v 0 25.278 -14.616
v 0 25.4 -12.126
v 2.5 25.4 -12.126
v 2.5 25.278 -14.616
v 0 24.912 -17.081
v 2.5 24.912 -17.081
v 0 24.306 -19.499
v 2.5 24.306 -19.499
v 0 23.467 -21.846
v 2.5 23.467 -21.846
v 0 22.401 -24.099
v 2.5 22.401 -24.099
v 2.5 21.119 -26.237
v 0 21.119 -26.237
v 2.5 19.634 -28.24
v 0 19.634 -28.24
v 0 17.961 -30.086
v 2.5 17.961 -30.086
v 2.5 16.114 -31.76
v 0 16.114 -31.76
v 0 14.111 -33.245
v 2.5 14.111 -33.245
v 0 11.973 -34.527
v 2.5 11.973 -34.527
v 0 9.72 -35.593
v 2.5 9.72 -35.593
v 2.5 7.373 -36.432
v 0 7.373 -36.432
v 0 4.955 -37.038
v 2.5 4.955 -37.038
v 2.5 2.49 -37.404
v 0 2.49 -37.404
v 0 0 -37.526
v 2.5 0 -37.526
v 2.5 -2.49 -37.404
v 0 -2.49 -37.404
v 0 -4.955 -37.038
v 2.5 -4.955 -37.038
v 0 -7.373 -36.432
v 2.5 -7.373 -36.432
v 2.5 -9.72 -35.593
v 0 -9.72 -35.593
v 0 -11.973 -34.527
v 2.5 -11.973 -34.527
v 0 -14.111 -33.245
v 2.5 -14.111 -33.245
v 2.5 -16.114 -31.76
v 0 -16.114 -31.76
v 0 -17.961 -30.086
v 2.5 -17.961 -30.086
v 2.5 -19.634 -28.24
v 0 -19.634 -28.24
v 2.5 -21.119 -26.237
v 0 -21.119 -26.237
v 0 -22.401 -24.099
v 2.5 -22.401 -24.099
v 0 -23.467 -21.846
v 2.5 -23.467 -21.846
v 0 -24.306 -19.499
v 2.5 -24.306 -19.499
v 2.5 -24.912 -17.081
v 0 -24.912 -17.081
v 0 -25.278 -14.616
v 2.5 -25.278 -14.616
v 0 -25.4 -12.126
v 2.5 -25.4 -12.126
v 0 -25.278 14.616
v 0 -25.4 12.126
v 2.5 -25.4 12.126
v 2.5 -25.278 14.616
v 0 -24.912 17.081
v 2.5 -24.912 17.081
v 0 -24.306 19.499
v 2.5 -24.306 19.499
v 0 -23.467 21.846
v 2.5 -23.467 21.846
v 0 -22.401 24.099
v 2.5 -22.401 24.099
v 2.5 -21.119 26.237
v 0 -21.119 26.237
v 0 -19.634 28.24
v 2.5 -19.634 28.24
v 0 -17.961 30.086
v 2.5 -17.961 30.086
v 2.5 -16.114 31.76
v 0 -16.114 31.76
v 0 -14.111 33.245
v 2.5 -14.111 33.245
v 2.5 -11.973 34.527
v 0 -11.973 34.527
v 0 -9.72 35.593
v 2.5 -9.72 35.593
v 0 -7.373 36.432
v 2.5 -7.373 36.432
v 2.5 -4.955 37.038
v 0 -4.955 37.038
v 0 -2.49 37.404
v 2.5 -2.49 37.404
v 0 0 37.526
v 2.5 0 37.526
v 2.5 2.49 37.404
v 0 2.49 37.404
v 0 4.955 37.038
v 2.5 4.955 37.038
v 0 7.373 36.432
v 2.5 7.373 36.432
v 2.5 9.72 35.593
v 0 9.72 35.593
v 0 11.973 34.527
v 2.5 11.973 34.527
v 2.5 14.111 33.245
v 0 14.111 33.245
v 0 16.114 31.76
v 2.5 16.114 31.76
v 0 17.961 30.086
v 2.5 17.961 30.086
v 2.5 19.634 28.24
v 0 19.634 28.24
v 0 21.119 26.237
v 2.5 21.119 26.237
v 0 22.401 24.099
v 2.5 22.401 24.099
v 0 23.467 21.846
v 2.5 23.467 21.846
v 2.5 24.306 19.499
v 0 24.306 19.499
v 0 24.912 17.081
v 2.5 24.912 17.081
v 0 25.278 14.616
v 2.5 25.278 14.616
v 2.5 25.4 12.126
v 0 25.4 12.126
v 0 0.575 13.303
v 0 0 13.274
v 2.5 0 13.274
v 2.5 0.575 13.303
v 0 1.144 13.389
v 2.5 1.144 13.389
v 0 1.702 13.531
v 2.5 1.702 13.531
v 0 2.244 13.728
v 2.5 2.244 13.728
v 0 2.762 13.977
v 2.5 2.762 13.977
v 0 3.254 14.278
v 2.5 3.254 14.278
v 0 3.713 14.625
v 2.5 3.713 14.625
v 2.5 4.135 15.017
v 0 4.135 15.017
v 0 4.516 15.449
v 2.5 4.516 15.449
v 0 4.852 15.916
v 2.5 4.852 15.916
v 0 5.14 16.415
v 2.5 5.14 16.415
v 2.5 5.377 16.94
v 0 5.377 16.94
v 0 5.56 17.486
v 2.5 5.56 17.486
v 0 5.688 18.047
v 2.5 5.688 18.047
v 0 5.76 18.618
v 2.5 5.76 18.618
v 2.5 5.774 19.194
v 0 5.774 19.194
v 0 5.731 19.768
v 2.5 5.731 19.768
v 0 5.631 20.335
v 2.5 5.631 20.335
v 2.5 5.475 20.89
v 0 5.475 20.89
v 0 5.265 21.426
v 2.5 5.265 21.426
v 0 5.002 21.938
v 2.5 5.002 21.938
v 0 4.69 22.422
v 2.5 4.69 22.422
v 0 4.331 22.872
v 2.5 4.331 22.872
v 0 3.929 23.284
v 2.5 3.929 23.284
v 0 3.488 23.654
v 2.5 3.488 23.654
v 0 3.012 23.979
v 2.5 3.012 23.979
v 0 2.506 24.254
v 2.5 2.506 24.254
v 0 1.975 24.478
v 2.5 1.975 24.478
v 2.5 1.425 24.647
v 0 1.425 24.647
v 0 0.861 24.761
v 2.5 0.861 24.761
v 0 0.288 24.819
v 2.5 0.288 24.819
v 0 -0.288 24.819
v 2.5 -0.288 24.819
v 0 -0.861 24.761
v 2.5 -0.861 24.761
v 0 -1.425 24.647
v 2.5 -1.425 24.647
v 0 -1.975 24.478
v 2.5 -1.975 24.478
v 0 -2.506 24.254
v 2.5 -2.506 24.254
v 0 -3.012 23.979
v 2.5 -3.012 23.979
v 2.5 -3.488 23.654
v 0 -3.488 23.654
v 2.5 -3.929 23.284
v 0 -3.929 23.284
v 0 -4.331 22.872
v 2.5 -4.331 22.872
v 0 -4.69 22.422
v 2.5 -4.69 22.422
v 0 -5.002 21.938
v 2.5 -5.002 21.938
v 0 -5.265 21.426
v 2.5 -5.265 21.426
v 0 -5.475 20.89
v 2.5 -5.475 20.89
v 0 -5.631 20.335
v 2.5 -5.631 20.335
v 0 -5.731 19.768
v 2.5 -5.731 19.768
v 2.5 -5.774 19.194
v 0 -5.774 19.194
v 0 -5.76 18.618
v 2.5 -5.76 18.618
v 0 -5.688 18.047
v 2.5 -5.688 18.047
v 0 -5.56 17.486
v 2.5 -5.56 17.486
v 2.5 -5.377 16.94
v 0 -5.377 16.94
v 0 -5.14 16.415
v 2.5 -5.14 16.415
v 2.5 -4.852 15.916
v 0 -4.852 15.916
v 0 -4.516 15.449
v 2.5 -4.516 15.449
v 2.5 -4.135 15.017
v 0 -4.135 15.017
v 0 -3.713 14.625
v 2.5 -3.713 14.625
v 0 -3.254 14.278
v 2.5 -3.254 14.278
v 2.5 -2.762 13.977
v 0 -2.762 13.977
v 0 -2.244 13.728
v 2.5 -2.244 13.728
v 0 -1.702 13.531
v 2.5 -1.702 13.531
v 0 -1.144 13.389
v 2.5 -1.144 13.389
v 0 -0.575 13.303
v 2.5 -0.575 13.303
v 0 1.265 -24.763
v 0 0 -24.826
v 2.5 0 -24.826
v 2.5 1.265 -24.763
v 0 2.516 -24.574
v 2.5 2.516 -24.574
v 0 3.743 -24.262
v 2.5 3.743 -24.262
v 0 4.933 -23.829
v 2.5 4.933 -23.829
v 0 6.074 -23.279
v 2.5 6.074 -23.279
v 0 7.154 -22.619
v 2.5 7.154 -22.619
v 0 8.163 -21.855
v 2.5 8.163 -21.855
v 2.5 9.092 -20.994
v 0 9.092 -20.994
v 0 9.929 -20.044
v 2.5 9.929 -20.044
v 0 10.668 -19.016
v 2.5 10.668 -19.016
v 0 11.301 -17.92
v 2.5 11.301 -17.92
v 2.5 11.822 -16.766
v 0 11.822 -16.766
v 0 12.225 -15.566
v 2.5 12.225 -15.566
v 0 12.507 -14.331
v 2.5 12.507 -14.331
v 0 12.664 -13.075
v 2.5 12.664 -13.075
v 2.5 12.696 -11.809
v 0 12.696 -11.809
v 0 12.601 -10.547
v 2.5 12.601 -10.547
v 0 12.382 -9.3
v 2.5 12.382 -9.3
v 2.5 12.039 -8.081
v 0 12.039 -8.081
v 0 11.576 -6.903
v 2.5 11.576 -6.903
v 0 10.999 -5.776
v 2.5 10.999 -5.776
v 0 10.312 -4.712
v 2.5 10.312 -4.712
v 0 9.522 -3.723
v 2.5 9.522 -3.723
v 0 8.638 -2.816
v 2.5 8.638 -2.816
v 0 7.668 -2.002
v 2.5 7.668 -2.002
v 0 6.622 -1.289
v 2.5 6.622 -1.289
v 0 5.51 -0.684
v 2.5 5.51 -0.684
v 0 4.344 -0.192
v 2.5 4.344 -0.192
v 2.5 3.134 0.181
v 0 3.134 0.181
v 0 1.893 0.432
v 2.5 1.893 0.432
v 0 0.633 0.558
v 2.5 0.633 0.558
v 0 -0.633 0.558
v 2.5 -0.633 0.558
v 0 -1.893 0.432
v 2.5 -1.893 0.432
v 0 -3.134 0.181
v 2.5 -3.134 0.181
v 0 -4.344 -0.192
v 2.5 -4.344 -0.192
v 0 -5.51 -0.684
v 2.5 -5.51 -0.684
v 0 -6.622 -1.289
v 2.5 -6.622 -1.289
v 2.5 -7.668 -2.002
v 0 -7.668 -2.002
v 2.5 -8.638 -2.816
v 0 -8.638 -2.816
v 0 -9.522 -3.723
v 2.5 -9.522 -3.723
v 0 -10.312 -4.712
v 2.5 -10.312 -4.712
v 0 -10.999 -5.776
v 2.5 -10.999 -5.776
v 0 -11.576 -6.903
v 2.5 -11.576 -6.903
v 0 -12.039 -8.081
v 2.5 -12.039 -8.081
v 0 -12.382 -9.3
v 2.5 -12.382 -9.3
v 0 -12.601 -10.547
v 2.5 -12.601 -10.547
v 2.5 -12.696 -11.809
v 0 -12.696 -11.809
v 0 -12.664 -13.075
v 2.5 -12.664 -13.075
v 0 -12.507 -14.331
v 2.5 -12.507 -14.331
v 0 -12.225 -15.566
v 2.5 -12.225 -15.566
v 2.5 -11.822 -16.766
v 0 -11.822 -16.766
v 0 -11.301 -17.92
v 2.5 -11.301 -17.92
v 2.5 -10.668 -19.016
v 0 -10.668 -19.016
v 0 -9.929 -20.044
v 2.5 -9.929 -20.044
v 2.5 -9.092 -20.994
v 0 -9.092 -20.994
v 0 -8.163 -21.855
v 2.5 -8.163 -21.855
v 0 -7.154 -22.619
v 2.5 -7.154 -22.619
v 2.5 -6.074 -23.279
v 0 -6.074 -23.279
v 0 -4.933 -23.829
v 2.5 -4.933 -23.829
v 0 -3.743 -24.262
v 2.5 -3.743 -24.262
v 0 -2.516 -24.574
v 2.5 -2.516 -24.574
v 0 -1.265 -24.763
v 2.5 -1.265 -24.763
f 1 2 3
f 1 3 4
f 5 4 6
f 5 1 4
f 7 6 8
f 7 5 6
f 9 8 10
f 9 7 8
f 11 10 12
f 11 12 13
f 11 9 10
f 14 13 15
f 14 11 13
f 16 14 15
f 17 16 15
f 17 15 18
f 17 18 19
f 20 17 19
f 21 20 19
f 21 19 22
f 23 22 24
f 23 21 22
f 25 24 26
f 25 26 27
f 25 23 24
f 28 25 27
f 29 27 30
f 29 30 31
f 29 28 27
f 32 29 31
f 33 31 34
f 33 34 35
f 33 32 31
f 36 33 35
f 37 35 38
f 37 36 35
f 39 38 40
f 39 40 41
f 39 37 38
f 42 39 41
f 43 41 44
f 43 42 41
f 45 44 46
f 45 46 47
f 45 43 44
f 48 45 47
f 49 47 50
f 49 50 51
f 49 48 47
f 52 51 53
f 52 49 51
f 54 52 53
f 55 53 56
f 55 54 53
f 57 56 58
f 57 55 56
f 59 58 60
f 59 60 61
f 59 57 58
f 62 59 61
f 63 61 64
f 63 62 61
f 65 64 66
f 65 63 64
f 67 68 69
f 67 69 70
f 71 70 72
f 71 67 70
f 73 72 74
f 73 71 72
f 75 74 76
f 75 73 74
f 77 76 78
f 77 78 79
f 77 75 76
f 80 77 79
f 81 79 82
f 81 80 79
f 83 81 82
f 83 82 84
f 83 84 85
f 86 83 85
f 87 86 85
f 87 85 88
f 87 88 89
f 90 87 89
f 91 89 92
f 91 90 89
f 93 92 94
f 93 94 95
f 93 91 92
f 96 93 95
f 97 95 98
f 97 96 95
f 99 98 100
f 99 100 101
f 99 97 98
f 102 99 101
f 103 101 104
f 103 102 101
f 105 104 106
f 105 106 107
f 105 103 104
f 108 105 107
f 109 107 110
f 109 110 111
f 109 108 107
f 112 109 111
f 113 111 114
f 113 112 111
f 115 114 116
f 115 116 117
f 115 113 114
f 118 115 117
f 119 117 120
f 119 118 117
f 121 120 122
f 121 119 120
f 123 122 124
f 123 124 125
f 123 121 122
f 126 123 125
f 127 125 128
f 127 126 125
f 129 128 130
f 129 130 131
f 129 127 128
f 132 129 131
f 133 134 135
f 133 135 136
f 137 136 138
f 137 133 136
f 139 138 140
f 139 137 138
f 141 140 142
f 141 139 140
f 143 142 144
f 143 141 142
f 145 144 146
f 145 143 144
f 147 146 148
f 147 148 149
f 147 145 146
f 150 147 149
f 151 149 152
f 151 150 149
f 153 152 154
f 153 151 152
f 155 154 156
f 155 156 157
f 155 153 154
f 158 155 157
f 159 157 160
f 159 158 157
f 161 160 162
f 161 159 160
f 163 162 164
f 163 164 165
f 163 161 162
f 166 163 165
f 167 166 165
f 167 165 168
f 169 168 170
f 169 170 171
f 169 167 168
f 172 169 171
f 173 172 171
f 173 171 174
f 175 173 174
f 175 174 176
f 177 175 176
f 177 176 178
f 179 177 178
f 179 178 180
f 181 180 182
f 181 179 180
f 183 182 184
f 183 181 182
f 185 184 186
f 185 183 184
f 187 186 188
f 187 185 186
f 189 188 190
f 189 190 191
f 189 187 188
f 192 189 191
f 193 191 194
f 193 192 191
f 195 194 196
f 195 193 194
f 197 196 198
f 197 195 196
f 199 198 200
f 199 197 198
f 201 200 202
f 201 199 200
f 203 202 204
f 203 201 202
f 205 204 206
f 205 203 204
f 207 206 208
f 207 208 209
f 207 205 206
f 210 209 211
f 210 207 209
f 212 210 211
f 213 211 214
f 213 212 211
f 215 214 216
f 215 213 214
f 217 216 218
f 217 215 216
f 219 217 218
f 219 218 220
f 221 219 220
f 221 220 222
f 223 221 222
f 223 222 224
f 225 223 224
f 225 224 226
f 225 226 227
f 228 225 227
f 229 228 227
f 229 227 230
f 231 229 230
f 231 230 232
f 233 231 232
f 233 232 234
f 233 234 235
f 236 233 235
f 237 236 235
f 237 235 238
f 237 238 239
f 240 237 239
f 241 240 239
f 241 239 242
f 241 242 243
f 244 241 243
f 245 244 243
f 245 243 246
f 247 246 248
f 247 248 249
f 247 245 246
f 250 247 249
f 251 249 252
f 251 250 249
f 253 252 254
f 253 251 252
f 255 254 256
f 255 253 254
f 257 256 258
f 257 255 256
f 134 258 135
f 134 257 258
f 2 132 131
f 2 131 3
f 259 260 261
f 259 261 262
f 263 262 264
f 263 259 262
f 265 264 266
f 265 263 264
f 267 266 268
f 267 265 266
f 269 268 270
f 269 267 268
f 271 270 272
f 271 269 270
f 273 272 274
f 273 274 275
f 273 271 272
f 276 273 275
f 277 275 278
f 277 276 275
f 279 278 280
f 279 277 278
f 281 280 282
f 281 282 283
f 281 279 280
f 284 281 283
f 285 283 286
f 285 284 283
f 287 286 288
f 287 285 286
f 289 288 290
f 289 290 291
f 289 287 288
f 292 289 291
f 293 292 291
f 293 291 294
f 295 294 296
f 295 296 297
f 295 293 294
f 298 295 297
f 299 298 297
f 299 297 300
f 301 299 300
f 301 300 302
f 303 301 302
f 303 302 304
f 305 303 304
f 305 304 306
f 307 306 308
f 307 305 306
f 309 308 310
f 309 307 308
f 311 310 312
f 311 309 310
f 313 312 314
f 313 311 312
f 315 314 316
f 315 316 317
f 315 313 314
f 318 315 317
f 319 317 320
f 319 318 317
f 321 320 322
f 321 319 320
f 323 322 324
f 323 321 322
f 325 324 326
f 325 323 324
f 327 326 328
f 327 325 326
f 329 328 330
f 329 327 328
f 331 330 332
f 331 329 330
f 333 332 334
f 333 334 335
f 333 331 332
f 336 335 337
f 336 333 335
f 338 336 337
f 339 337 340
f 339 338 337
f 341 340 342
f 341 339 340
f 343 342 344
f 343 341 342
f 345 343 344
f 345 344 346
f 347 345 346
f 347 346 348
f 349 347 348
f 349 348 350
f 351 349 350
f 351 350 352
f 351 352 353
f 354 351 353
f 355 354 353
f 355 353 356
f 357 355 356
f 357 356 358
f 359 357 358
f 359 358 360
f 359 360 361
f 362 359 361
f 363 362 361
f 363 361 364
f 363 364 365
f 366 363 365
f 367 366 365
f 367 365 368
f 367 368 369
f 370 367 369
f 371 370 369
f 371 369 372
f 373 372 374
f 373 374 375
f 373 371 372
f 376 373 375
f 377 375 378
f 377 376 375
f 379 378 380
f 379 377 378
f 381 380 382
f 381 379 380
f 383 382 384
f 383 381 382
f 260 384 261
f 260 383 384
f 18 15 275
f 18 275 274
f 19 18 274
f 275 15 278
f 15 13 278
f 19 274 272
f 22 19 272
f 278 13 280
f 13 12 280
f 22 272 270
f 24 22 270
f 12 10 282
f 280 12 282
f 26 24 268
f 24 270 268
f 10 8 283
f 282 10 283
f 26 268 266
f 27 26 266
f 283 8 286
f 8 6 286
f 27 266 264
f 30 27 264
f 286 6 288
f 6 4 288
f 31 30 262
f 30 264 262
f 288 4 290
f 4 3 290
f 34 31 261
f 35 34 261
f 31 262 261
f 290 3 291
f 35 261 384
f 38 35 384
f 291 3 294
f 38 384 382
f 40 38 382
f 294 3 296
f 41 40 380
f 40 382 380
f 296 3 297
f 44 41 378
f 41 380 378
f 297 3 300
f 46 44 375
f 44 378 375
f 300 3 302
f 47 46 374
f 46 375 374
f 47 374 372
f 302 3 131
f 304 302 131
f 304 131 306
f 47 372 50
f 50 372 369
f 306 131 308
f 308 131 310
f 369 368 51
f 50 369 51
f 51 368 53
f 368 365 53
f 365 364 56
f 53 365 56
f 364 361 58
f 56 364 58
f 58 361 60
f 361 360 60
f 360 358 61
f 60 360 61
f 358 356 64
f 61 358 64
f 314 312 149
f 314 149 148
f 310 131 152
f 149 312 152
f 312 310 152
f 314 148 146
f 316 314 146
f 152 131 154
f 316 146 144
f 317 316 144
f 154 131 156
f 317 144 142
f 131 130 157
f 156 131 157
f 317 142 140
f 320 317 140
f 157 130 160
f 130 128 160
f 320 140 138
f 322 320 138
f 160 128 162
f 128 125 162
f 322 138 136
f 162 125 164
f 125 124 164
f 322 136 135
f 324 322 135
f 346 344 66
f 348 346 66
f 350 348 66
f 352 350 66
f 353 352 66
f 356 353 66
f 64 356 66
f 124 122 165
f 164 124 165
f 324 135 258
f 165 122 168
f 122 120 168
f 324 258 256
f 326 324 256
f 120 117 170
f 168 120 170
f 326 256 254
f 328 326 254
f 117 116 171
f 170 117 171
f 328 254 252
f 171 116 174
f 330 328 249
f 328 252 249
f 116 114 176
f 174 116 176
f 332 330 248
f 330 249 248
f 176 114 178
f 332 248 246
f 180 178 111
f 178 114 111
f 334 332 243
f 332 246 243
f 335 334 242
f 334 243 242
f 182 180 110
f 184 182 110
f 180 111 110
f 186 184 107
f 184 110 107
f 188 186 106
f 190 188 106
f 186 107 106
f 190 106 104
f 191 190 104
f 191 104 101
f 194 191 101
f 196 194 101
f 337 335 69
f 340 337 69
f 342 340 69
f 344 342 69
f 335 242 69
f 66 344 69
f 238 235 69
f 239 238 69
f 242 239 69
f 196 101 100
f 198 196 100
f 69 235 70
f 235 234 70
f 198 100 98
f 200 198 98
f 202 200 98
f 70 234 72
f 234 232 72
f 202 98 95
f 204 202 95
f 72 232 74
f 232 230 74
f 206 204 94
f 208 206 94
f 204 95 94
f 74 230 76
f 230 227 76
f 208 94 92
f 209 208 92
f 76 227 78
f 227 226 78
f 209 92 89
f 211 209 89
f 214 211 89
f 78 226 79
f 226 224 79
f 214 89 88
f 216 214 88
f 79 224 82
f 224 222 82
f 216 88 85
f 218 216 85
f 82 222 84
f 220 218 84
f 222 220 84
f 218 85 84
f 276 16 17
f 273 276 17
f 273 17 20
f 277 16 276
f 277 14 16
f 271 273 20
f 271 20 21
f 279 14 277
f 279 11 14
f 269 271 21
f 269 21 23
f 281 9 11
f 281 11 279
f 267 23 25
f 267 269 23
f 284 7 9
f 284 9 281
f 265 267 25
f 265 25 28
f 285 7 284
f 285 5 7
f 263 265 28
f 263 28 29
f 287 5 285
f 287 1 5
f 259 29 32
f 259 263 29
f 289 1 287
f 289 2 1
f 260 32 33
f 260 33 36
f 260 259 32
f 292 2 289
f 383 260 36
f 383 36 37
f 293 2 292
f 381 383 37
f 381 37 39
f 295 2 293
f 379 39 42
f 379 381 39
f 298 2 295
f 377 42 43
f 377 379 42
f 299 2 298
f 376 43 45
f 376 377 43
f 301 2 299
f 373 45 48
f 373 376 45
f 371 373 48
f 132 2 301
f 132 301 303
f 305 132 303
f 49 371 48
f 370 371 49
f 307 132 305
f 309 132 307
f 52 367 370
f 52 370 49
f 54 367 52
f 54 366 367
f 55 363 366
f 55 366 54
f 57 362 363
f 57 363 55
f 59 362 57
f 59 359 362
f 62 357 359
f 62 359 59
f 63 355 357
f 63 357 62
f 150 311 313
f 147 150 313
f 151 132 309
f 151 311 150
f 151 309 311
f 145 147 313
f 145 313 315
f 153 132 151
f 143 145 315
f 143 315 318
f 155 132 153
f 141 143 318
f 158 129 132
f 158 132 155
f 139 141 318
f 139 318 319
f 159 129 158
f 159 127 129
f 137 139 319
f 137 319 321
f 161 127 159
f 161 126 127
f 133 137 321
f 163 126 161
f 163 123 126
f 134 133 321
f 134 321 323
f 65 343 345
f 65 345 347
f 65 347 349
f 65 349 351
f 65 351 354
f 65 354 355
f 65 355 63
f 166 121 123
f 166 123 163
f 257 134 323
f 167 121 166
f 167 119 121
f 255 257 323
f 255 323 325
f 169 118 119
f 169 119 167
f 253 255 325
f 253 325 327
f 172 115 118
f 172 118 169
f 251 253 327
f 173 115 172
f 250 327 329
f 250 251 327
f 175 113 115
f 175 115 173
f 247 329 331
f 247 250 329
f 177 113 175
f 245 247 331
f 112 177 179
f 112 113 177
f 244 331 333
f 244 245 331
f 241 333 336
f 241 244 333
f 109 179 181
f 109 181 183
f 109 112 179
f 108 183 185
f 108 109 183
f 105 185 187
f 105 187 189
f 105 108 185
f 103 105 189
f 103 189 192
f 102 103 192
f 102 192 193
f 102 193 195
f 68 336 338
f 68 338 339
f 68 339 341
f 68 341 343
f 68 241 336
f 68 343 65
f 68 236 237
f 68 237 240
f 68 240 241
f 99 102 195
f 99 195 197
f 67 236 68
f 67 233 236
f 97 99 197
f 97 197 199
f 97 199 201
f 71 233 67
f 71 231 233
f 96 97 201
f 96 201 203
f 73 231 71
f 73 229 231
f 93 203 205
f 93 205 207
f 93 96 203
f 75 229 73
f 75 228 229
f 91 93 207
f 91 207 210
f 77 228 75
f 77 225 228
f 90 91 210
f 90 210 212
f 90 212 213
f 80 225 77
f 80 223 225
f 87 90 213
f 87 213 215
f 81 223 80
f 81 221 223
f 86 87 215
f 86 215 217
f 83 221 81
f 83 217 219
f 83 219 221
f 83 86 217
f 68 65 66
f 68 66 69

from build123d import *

# Parameters (mm, degrees)
SKETCH1_R           = 5.7759727
SKETCH1_R_2         = 12.7
BOSS_EXTRUDE1_DEPTH = 2.5


with BuildPart() as part:
    # Sketch1 → Boss-Extrude1 (new body)
    with BuildSketch(Plane.YZ):
        with BuildLine():
            Line((-25.399999937, -12.125972668), (-25.399999937, 12.125972668))
            ThreePointArc((-25.399999937, 12.125972668), (0, 37.525972605), (25.399999936, 12.125972668))
            Line((25.399999936, 12.125972668), (25.399999937, -12.125972668))
            ThreePointArc((25.399999937, -12.125972668), (0, -37.525972605), (-25.399999937, -12.125972668))
        make_face()
        with Locations(Location((0, 19.049999968, 0), (0, 0, 270))):
            Circle(SKETCH1_R, mode=Mode.SUBTRACT)
        with Locations(Location((0, -12.125972668, 0), (0, 0, 270))):
            Circle(SKETCH1_R_2, mode=Mode.SUBTRACT)
    extrude(amount=BOSS_EXTRUDE1_DEPTH)


solid = part.part
